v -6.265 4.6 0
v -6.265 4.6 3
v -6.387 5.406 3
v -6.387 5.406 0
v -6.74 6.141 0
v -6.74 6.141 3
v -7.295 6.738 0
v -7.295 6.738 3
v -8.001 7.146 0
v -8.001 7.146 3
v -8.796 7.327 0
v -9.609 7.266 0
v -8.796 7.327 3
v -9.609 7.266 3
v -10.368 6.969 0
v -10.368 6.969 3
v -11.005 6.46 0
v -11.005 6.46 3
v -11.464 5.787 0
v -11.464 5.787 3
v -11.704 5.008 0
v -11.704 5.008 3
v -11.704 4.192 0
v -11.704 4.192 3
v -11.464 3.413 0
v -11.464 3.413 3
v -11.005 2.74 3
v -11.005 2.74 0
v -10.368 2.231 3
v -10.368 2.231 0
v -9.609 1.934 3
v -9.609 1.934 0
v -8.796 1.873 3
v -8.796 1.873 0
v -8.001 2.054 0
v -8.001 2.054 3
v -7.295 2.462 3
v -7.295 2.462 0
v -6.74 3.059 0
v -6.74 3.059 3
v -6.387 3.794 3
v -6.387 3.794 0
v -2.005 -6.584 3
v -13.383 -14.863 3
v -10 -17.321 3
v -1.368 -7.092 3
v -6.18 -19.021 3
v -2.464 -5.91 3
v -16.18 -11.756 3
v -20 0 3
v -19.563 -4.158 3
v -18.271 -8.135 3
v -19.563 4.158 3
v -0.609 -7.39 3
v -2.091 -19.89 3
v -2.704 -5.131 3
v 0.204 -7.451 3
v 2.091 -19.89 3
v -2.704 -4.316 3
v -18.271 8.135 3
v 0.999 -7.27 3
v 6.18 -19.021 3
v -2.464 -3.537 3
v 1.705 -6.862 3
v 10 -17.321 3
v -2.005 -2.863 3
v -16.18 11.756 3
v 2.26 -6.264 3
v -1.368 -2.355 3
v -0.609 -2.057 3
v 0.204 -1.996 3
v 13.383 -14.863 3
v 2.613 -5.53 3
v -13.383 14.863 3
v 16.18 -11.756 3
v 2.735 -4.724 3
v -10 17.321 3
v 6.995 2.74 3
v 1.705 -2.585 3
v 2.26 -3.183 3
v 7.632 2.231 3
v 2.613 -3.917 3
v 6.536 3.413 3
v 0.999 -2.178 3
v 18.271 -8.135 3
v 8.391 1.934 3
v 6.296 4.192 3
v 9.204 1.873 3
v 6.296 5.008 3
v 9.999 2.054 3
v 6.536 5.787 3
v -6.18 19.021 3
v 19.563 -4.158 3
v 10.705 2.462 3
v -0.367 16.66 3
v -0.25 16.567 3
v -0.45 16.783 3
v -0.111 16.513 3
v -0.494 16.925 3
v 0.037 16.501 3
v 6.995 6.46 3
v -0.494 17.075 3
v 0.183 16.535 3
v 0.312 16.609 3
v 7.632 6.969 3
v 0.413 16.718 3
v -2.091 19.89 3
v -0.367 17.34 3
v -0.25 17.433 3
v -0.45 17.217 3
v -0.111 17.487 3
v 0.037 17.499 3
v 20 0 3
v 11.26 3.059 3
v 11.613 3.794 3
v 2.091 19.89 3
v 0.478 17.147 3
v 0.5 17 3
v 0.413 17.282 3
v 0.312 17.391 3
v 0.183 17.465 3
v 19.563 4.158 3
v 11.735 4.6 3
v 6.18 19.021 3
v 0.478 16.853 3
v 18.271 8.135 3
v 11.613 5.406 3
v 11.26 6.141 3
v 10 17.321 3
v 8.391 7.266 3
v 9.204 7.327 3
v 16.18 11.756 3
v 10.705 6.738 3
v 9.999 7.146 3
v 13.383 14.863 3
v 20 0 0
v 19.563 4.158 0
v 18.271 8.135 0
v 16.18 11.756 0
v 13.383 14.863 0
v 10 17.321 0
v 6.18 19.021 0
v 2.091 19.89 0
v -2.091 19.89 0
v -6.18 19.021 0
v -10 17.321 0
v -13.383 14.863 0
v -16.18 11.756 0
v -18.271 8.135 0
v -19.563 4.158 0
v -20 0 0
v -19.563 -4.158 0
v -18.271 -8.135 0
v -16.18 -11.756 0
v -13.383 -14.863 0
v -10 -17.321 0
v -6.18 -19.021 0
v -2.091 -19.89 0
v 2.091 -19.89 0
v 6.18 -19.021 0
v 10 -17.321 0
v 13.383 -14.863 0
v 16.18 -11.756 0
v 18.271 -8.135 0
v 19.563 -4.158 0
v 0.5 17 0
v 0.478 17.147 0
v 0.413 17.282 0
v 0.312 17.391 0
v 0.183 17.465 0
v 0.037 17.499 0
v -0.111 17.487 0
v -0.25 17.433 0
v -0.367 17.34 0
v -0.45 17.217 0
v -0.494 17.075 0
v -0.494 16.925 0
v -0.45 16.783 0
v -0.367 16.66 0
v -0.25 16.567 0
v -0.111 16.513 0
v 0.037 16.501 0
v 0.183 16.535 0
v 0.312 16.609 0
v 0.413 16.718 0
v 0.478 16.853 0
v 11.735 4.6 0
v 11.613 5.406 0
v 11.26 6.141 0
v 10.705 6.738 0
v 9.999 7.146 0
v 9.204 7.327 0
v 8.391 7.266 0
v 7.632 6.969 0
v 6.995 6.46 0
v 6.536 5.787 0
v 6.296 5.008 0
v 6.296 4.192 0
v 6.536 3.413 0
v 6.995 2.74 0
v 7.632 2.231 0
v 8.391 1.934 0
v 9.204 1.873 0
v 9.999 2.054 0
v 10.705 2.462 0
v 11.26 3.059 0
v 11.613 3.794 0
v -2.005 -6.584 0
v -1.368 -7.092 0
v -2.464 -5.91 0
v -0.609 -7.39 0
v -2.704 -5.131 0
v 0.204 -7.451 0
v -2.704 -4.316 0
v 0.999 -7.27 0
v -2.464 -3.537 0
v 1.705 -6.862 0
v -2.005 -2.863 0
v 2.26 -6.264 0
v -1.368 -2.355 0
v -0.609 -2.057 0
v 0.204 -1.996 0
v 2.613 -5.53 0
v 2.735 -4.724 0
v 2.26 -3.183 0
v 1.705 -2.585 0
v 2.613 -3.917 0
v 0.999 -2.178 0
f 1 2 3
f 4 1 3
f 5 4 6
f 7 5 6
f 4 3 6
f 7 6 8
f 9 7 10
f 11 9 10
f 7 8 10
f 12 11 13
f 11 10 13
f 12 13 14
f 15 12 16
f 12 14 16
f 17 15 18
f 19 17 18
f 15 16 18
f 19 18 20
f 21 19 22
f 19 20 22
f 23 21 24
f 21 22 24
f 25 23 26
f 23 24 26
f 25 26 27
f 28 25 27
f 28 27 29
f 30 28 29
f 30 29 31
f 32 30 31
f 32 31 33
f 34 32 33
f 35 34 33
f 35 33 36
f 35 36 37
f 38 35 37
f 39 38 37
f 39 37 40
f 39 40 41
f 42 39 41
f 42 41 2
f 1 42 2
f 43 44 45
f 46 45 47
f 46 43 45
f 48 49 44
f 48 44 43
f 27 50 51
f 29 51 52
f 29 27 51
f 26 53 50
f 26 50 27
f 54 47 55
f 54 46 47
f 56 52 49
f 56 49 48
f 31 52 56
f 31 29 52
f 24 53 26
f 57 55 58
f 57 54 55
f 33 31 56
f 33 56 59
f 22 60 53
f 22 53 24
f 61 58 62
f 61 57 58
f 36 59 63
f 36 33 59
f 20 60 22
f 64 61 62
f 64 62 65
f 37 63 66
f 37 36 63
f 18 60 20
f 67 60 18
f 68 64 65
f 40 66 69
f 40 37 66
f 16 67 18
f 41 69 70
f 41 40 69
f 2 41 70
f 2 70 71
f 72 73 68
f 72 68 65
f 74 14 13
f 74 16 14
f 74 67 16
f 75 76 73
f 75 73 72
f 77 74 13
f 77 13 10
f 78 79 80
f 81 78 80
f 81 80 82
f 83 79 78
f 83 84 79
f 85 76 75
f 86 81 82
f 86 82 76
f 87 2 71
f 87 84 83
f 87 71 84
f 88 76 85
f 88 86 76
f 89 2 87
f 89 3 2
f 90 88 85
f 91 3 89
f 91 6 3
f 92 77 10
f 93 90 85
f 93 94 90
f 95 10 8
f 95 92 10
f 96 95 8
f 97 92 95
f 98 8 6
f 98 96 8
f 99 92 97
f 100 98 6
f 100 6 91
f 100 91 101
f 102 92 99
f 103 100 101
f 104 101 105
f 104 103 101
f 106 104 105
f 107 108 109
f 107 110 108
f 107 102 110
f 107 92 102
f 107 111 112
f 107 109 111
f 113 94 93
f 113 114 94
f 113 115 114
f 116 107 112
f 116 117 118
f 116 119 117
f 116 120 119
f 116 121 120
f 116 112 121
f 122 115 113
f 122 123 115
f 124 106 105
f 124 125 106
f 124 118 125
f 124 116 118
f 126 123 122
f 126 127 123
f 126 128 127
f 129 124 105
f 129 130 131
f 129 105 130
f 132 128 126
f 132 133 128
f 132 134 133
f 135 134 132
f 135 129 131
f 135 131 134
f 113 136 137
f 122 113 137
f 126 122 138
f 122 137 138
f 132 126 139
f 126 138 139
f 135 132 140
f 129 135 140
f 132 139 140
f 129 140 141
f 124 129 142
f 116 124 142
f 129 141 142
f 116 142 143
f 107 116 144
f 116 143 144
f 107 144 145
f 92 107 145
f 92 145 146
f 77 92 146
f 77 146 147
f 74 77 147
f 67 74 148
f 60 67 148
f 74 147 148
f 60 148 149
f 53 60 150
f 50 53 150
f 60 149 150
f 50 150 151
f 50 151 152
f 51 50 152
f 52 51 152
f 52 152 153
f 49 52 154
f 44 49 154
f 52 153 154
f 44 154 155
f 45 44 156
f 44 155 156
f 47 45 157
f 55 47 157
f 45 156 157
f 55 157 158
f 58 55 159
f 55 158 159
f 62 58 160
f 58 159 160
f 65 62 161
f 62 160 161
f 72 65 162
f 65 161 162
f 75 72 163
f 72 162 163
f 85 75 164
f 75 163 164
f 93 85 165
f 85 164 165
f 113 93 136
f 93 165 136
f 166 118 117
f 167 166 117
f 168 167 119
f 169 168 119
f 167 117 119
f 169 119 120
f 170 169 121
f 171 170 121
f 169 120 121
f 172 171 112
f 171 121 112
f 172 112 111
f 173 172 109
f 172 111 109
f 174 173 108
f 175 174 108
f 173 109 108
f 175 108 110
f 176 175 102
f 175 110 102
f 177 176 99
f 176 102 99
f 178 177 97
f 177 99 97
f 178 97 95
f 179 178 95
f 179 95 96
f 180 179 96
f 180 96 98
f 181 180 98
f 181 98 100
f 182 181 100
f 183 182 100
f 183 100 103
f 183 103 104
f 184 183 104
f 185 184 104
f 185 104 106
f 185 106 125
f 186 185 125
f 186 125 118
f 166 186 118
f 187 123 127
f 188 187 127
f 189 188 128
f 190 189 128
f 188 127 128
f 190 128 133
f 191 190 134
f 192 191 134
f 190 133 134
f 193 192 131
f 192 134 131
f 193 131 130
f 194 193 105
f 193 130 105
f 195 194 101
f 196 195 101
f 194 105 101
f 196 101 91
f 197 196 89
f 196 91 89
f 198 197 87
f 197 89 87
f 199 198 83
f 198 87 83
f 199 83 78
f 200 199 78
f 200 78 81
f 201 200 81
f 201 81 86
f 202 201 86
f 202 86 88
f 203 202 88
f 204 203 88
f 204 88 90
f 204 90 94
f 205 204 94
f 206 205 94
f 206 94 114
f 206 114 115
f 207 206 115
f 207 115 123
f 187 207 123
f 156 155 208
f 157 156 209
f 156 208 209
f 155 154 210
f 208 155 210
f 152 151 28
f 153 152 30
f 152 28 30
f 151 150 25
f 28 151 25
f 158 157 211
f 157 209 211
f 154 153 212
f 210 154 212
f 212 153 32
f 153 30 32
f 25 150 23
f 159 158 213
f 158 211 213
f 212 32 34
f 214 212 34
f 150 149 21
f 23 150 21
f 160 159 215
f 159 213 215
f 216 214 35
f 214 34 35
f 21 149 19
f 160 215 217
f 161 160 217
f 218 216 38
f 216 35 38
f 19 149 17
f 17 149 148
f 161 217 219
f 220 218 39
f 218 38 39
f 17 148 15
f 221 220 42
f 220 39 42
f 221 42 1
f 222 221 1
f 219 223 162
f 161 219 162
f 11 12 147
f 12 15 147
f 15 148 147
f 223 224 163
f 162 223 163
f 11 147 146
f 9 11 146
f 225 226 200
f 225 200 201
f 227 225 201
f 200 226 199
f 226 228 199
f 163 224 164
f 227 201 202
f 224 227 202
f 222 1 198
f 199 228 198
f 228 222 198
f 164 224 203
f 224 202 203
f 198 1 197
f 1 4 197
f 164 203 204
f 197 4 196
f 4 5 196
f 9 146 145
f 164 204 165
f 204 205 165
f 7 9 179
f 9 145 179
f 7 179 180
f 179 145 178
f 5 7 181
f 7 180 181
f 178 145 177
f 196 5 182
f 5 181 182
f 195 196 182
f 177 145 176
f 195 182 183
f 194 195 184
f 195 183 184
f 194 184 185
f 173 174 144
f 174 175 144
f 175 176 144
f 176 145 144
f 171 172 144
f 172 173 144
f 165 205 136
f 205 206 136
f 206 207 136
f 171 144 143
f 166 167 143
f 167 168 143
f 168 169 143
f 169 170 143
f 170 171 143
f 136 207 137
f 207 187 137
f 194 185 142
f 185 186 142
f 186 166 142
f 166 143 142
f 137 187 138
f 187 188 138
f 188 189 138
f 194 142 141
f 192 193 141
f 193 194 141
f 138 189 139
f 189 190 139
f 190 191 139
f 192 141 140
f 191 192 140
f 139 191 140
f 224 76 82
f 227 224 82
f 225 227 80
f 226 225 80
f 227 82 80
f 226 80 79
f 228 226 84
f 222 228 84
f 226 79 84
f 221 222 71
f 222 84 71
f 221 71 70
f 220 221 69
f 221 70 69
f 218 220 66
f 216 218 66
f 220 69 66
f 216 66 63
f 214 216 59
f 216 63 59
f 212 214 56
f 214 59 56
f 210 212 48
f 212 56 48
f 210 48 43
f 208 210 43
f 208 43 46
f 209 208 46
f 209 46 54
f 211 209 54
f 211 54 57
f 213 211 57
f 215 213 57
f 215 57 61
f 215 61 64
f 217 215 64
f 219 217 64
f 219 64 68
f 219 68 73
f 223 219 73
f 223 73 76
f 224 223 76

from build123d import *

# Parameters (mm, degrees)
SKETCH1_R           = 20
BOSS_EXTRUDE1_DEPTH = 3
SKETCH3_R           = 2.735
CUT_EXTRUDE1_DEPTH  = 10
SKETCH4_R           = 0.5
CUT_EXTRUDE2_DEPTH  = 10


with BuildPart() as part:
    # Sketch1 → Boss-Extrude1 (new body)
    with BuildSketch(Plane.XY):
        Circle(SKETCH1_R)
    extrude(amount=BOSS_EXTRUDE1_DEPTH)

    # Sketch3 → Cut-Extrude1 (cut)
    with BuildSketch(Plane.XY.offset(3)):
        with Locations((0, -4.723654738)):
            Circle(SKETCH3_R)
        with Locations((9, 4.6)):
            Circle(SKETCH3_R)
        with Locations((-9, 4.6)):
            Circle(SKETCH3_R)
    extrude(amount=-CUT_EXTRUDE1_DEPTH, mode=Mode.SUBTRACT)

    # Sketch4 → Cut-Extrude2 (cut)
    with BuildSketch(Plane.XY.offset(3)):
        with Locations((0, 17)):
            Circle(SKETCH4_R)
    extrude(amount=-CUT_EXTRUDE2_DEPTH, mode=Mode.SUBTRACT)


solid = part.part
